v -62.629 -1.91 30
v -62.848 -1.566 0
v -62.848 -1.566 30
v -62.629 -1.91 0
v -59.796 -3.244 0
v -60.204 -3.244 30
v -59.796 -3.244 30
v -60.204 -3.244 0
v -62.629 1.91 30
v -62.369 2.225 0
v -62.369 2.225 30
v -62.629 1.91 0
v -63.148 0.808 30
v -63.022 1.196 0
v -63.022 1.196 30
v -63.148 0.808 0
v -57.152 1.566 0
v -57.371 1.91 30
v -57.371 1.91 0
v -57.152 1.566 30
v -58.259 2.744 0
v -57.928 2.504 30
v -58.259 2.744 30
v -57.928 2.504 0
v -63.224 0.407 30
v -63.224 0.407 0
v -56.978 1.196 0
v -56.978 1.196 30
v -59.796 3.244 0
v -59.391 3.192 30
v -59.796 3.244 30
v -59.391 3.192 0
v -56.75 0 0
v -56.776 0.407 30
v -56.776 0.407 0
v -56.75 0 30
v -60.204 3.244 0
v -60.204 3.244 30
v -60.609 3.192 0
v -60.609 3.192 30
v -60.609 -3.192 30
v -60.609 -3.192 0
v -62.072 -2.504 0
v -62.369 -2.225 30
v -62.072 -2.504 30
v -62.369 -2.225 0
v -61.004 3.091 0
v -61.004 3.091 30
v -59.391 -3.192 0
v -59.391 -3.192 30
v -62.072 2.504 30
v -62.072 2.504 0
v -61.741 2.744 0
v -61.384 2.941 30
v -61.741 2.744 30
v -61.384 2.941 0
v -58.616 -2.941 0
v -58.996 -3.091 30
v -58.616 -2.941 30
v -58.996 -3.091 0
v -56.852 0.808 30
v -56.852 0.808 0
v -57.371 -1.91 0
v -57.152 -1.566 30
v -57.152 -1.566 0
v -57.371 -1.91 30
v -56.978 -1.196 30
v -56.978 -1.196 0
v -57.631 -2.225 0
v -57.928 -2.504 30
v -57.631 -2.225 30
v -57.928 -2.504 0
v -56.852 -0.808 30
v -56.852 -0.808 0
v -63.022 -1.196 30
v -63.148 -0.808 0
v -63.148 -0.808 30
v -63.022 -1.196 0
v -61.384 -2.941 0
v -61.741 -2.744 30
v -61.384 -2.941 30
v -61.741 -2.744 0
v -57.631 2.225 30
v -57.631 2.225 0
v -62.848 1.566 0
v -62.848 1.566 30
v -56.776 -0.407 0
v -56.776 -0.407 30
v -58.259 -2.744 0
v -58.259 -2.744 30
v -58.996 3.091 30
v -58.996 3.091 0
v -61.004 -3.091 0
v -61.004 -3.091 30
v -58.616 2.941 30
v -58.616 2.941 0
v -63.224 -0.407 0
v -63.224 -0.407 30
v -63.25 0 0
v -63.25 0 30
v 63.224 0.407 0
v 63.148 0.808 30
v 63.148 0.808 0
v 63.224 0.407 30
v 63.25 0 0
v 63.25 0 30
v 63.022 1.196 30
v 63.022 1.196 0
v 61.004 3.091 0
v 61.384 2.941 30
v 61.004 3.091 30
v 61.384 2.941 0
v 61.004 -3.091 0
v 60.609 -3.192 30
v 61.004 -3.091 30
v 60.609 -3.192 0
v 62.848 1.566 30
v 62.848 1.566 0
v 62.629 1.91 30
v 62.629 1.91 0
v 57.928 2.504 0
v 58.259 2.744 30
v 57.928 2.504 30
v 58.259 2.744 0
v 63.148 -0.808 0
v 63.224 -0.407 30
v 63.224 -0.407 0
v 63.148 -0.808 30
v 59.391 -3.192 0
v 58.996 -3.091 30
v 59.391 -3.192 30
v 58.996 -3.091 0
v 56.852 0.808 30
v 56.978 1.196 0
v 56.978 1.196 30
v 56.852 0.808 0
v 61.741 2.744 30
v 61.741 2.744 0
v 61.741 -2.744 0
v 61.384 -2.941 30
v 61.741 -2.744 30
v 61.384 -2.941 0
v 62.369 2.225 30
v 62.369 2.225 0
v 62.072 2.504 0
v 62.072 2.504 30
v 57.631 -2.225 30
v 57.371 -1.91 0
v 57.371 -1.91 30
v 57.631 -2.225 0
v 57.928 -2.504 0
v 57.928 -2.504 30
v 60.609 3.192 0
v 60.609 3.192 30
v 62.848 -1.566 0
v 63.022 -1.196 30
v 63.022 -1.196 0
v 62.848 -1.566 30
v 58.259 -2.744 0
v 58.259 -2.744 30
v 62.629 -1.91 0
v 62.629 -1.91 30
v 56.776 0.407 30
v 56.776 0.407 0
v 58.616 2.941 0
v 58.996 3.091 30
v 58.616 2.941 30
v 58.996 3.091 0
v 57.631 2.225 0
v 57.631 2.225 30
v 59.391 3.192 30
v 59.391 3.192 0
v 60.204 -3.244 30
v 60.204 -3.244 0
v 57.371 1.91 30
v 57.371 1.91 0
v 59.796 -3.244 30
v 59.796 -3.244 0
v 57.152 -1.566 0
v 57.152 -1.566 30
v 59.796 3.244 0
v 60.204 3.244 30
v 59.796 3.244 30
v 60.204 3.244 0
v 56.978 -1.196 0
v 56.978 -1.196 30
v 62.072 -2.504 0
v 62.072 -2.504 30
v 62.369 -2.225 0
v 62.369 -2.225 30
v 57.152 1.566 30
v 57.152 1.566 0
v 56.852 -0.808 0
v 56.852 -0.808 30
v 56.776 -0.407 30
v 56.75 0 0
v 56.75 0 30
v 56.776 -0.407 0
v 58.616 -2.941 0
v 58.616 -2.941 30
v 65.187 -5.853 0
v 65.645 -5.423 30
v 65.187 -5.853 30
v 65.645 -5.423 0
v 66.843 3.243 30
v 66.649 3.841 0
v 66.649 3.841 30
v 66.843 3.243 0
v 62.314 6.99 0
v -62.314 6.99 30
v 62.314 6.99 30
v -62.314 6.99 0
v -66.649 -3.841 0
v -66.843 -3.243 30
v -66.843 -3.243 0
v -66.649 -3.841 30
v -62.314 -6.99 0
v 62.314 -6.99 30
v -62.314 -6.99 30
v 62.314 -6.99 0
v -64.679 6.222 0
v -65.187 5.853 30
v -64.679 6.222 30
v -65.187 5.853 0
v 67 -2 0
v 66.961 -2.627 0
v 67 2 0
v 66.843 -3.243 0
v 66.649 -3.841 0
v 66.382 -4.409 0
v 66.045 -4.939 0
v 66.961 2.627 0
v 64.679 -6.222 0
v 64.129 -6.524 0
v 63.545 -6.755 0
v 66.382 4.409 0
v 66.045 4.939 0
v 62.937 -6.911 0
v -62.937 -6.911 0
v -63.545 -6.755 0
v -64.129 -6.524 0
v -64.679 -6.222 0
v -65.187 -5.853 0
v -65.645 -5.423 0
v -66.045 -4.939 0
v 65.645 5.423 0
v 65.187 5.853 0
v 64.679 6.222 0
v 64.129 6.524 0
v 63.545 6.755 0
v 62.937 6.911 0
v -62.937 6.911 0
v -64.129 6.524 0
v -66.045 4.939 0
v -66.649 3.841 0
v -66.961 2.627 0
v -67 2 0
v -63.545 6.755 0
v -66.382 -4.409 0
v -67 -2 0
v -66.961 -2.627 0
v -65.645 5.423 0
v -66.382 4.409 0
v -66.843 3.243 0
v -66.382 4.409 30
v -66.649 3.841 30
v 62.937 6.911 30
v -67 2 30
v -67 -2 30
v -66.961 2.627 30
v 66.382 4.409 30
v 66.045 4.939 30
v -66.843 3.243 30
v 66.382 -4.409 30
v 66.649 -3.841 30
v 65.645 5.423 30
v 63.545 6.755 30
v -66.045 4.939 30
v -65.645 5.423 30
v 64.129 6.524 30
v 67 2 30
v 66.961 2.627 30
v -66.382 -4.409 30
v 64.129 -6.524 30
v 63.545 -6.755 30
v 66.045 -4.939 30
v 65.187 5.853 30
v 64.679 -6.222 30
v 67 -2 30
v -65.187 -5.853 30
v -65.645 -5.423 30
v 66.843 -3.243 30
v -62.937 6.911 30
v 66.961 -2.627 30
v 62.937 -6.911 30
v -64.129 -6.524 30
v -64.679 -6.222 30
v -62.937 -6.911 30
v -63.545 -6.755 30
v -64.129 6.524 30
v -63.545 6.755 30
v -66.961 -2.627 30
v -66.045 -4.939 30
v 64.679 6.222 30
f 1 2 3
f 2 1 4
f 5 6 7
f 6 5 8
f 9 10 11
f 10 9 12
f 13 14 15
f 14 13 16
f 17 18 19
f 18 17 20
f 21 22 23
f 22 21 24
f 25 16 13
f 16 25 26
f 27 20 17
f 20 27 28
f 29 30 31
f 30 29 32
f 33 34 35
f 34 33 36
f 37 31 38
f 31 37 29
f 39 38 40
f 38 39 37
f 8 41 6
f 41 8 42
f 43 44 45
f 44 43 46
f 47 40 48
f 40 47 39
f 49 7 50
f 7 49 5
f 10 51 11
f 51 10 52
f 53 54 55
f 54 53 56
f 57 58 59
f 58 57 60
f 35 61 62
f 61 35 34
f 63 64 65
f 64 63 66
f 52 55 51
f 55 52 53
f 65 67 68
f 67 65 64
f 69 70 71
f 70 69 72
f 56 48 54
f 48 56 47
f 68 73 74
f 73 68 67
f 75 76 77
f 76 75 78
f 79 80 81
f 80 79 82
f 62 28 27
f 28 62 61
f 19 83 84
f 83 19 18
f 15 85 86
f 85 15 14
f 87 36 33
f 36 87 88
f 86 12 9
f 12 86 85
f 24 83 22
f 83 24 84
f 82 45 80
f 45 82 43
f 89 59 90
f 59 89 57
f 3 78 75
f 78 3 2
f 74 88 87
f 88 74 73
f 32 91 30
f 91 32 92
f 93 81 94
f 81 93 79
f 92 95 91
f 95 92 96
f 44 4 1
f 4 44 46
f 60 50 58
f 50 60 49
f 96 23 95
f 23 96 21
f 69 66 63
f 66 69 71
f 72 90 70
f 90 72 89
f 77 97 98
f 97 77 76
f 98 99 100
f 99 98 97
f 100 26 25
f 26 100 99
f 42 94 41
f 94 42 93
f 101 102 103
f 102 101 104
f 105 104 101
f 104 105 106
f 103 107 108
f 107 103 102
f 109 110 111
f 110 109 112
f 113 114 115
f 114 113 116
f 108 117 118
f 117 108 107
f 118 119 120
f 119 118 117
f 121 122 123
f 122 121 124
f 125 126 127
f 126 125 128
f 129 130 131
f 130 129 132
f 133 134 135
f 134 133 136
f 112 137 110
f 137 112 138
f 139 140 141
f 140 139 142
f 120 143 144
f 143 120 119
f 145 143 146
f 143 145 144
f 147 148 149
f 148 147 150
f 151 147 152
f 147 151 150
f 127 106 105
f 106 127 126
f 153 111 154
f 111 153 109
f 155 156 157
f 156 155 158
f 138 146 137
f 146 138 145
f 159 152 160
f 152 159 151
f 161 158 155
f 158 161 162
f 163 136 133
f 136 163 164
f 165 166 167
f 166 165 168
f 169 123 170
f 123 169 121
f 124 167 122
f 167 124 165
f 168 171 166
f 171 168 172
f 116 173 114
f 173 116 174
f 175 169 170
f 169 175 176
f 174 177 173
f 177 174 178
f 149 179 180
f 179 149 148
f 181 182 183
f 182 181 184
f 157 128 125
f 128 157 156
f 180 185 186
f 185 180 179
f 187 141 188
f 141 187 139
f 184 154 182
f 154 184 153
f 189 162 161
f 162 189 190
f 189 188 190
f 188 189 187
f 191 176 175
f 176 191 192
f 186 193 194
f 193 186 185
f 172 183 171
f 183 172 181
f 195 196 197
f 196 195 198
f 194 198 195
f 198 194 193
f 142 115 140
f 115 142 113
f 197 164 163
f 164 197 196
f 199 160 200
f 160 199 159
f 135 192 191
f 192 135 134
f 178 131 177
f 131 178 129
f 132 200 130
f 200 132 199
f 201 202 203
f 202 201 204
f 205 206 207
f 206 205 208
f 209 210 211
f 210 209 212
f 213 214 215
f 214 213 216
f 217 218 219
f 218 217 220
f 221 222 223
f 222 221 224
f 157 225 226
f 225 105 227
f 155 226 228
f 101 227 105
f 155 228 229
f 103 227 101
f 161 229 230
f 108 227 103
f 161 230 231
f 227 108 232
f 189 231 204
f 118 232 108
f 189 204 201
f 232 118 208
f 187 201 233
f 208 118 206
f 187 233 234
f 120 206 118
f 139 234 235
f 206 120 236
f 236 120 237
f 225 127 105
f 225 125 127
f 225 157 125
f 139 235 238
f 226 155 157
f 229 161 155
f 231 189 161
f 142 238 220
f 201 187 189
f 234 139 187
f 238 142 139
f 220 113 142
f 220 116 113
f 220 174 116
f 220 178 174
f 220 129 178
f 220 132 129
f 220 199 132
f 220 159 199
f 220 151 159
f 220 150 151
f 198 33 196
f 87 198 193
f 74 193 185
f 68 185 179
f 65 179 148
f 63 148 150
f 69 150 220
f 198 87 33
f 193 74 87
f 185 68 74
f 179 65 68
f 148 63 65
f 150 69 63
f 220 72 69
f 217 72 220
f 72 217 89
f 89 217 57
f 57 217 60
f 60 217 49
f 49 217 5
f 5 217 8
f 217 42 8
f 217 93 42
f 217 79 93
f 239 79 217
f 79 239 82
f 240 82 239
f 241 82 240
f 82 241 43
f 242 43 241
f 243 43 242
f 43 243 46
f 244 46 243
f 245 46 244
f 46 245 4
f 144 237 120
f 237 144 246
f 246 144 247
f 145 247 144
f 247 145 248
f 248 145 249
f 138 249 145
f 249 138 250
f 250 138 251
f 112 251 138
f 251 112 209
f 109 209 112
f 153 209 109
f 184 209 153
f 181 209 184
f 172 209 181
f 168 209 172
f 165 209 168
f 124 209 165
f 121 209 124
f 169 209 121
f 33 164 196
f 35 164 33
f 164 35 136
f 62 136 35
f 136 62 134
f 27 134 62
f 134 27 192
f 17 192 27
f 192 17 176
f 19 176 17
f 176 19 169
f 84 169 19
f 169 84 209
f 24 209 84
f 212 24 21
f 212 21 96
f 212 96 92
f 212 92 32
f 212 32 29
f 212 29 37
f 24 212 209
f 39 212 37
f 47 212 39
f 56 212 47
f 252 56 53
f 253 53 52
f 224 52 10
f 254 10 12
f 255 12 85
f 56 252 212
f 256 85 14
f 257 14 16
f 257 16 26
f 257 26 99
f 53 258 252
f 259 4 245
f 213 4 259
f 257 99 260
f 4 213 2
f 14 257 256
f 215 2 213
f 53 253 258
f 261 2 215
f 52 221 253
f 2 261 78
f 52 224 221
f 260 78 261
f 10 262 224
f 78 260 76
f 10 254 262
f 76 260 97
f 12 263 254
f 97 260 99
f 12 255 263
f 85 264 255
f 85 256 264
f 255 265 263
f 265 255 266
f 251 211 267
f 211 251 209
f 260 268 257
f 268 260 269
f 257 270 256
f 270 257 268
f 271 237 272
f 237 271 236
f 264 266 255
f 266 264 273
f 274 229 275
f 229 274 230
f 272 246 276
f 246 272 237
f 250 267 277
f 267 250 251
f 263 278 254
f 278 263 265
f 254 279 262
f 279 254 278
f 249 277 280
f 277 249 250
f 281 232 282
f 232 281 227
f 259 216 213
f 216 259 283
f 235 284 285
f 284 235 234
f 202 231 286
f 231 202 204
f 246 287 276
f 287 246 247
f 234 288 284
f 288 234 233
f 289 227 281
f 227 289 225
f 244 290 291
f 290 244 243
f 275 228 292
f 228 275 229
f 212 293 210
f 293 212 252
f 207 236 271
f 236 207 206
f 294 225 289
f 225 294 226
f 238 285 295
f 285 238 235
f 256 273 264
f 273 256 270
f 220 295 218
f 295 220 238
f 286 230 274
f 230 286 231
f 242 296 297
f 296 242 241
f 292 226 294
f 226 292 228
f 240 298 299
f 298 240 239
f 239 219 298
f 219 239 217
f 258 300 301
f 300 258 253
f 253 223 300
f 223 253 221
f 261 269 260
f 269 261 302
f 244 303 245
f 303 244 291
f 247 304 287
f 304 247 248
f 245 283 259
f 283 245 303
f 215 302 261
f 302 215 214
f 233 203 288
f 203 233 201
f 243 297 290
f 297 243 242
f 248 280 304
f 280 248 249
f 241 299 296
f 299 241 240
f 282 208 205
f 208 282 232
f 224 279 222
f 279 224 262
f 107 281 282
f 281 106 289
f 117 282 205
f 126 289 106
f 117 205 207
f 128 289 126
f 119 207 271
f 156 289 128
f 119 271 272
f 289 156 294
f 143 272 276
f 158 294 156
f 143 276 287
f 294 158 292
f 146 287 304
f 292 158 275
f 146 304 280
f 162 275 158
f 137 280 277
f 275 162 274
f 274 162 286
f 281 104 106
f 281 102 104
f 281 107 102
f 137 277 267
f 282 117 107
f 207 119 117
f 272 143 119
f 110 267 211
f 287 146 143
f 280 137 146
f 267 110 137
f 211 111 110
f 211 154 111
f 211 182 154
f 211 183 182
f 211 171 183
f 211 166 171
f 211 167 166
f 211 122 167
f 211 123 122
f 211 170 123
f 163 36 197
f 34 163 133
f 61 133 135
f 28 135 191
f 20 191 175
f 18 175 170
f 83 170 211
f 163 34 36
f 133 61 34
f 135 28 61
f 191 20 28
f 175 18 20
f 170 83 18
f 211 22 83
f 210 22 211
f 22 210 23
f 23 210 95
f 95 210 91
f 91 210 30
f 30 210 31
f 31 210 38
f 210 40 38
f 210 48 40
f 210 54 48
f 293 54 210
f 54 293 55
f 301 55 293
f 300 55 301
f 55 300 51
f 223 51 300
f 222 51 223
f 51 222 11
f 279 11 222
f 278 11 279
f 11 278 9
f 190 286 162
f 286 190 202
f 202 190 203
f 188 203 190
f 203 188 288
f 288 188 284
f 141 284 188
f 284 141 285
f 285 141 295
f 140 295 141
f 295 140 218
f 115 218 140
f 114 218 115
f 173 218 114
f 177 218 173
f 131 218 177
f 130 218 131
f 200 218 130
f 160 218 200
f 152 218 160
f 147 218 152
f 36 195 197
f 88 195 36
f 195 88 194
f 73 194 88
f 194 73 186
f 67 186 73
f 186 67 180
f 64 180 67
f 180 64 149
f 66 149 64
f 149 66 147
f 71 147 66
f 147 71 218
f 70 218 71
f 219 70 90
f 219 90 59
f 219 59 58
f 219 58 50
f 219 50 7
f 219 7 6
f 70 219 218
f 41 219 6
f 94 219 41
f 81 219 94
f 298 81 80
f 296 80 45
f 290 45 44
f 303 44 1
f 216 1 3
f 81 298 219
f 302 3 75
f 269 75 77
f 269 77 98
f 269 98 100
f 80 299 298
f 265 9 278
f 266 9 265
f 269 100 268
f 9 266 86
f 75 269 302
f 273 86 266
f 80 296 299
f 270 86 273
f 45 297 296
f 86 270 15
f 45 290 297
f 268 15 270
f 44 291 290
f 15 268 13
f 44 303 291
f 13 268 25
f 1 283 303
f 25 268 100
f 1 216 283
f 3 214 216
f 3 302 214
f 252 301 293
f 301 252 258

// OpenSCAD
$fn = 50;


difference() {
	union() {
		hull() {
			translate(v = [-62.0000000000, 2.0000000000, 0]) {
				cylinder(h = 30, r = 5);
			}
			translate(v = [62.0000000000, 2.0000000000, 0]) {
				cylinder(h = 30, r = 5);
			}
			translate(v = [-62.0000000000, -2.0000000000, 0]) {
				cylinder(h = 30, r = 5);
			}
			translate(v = [62.0000000000, -2.0000000000, 0]) {
				cylinder(h = 30, r = 5);
			}
		}
	}
	union() {
		translate(v = [-60.0000000000, 0.0000000000, -100.0000000000]) {
			cylinder(h = 200, r = 3.2500000000);
		}
		translate(v = [-60.0000000000, 0.0000000000, -100.0000000000]) {
			cylinder(h = 200, r = 3.2500000000);
		}
		translate(v = [60.0000000000, 0.0000000000, -100.0000000000]) {
			cylinder(h = 200, r = 3.2500000000);
		}
		translate(v = [60.0000000000, 0.0000000000, -100.0000000000]) {
			cylinder(h = 200, r = 3.2500000000);
		}
	}
}
